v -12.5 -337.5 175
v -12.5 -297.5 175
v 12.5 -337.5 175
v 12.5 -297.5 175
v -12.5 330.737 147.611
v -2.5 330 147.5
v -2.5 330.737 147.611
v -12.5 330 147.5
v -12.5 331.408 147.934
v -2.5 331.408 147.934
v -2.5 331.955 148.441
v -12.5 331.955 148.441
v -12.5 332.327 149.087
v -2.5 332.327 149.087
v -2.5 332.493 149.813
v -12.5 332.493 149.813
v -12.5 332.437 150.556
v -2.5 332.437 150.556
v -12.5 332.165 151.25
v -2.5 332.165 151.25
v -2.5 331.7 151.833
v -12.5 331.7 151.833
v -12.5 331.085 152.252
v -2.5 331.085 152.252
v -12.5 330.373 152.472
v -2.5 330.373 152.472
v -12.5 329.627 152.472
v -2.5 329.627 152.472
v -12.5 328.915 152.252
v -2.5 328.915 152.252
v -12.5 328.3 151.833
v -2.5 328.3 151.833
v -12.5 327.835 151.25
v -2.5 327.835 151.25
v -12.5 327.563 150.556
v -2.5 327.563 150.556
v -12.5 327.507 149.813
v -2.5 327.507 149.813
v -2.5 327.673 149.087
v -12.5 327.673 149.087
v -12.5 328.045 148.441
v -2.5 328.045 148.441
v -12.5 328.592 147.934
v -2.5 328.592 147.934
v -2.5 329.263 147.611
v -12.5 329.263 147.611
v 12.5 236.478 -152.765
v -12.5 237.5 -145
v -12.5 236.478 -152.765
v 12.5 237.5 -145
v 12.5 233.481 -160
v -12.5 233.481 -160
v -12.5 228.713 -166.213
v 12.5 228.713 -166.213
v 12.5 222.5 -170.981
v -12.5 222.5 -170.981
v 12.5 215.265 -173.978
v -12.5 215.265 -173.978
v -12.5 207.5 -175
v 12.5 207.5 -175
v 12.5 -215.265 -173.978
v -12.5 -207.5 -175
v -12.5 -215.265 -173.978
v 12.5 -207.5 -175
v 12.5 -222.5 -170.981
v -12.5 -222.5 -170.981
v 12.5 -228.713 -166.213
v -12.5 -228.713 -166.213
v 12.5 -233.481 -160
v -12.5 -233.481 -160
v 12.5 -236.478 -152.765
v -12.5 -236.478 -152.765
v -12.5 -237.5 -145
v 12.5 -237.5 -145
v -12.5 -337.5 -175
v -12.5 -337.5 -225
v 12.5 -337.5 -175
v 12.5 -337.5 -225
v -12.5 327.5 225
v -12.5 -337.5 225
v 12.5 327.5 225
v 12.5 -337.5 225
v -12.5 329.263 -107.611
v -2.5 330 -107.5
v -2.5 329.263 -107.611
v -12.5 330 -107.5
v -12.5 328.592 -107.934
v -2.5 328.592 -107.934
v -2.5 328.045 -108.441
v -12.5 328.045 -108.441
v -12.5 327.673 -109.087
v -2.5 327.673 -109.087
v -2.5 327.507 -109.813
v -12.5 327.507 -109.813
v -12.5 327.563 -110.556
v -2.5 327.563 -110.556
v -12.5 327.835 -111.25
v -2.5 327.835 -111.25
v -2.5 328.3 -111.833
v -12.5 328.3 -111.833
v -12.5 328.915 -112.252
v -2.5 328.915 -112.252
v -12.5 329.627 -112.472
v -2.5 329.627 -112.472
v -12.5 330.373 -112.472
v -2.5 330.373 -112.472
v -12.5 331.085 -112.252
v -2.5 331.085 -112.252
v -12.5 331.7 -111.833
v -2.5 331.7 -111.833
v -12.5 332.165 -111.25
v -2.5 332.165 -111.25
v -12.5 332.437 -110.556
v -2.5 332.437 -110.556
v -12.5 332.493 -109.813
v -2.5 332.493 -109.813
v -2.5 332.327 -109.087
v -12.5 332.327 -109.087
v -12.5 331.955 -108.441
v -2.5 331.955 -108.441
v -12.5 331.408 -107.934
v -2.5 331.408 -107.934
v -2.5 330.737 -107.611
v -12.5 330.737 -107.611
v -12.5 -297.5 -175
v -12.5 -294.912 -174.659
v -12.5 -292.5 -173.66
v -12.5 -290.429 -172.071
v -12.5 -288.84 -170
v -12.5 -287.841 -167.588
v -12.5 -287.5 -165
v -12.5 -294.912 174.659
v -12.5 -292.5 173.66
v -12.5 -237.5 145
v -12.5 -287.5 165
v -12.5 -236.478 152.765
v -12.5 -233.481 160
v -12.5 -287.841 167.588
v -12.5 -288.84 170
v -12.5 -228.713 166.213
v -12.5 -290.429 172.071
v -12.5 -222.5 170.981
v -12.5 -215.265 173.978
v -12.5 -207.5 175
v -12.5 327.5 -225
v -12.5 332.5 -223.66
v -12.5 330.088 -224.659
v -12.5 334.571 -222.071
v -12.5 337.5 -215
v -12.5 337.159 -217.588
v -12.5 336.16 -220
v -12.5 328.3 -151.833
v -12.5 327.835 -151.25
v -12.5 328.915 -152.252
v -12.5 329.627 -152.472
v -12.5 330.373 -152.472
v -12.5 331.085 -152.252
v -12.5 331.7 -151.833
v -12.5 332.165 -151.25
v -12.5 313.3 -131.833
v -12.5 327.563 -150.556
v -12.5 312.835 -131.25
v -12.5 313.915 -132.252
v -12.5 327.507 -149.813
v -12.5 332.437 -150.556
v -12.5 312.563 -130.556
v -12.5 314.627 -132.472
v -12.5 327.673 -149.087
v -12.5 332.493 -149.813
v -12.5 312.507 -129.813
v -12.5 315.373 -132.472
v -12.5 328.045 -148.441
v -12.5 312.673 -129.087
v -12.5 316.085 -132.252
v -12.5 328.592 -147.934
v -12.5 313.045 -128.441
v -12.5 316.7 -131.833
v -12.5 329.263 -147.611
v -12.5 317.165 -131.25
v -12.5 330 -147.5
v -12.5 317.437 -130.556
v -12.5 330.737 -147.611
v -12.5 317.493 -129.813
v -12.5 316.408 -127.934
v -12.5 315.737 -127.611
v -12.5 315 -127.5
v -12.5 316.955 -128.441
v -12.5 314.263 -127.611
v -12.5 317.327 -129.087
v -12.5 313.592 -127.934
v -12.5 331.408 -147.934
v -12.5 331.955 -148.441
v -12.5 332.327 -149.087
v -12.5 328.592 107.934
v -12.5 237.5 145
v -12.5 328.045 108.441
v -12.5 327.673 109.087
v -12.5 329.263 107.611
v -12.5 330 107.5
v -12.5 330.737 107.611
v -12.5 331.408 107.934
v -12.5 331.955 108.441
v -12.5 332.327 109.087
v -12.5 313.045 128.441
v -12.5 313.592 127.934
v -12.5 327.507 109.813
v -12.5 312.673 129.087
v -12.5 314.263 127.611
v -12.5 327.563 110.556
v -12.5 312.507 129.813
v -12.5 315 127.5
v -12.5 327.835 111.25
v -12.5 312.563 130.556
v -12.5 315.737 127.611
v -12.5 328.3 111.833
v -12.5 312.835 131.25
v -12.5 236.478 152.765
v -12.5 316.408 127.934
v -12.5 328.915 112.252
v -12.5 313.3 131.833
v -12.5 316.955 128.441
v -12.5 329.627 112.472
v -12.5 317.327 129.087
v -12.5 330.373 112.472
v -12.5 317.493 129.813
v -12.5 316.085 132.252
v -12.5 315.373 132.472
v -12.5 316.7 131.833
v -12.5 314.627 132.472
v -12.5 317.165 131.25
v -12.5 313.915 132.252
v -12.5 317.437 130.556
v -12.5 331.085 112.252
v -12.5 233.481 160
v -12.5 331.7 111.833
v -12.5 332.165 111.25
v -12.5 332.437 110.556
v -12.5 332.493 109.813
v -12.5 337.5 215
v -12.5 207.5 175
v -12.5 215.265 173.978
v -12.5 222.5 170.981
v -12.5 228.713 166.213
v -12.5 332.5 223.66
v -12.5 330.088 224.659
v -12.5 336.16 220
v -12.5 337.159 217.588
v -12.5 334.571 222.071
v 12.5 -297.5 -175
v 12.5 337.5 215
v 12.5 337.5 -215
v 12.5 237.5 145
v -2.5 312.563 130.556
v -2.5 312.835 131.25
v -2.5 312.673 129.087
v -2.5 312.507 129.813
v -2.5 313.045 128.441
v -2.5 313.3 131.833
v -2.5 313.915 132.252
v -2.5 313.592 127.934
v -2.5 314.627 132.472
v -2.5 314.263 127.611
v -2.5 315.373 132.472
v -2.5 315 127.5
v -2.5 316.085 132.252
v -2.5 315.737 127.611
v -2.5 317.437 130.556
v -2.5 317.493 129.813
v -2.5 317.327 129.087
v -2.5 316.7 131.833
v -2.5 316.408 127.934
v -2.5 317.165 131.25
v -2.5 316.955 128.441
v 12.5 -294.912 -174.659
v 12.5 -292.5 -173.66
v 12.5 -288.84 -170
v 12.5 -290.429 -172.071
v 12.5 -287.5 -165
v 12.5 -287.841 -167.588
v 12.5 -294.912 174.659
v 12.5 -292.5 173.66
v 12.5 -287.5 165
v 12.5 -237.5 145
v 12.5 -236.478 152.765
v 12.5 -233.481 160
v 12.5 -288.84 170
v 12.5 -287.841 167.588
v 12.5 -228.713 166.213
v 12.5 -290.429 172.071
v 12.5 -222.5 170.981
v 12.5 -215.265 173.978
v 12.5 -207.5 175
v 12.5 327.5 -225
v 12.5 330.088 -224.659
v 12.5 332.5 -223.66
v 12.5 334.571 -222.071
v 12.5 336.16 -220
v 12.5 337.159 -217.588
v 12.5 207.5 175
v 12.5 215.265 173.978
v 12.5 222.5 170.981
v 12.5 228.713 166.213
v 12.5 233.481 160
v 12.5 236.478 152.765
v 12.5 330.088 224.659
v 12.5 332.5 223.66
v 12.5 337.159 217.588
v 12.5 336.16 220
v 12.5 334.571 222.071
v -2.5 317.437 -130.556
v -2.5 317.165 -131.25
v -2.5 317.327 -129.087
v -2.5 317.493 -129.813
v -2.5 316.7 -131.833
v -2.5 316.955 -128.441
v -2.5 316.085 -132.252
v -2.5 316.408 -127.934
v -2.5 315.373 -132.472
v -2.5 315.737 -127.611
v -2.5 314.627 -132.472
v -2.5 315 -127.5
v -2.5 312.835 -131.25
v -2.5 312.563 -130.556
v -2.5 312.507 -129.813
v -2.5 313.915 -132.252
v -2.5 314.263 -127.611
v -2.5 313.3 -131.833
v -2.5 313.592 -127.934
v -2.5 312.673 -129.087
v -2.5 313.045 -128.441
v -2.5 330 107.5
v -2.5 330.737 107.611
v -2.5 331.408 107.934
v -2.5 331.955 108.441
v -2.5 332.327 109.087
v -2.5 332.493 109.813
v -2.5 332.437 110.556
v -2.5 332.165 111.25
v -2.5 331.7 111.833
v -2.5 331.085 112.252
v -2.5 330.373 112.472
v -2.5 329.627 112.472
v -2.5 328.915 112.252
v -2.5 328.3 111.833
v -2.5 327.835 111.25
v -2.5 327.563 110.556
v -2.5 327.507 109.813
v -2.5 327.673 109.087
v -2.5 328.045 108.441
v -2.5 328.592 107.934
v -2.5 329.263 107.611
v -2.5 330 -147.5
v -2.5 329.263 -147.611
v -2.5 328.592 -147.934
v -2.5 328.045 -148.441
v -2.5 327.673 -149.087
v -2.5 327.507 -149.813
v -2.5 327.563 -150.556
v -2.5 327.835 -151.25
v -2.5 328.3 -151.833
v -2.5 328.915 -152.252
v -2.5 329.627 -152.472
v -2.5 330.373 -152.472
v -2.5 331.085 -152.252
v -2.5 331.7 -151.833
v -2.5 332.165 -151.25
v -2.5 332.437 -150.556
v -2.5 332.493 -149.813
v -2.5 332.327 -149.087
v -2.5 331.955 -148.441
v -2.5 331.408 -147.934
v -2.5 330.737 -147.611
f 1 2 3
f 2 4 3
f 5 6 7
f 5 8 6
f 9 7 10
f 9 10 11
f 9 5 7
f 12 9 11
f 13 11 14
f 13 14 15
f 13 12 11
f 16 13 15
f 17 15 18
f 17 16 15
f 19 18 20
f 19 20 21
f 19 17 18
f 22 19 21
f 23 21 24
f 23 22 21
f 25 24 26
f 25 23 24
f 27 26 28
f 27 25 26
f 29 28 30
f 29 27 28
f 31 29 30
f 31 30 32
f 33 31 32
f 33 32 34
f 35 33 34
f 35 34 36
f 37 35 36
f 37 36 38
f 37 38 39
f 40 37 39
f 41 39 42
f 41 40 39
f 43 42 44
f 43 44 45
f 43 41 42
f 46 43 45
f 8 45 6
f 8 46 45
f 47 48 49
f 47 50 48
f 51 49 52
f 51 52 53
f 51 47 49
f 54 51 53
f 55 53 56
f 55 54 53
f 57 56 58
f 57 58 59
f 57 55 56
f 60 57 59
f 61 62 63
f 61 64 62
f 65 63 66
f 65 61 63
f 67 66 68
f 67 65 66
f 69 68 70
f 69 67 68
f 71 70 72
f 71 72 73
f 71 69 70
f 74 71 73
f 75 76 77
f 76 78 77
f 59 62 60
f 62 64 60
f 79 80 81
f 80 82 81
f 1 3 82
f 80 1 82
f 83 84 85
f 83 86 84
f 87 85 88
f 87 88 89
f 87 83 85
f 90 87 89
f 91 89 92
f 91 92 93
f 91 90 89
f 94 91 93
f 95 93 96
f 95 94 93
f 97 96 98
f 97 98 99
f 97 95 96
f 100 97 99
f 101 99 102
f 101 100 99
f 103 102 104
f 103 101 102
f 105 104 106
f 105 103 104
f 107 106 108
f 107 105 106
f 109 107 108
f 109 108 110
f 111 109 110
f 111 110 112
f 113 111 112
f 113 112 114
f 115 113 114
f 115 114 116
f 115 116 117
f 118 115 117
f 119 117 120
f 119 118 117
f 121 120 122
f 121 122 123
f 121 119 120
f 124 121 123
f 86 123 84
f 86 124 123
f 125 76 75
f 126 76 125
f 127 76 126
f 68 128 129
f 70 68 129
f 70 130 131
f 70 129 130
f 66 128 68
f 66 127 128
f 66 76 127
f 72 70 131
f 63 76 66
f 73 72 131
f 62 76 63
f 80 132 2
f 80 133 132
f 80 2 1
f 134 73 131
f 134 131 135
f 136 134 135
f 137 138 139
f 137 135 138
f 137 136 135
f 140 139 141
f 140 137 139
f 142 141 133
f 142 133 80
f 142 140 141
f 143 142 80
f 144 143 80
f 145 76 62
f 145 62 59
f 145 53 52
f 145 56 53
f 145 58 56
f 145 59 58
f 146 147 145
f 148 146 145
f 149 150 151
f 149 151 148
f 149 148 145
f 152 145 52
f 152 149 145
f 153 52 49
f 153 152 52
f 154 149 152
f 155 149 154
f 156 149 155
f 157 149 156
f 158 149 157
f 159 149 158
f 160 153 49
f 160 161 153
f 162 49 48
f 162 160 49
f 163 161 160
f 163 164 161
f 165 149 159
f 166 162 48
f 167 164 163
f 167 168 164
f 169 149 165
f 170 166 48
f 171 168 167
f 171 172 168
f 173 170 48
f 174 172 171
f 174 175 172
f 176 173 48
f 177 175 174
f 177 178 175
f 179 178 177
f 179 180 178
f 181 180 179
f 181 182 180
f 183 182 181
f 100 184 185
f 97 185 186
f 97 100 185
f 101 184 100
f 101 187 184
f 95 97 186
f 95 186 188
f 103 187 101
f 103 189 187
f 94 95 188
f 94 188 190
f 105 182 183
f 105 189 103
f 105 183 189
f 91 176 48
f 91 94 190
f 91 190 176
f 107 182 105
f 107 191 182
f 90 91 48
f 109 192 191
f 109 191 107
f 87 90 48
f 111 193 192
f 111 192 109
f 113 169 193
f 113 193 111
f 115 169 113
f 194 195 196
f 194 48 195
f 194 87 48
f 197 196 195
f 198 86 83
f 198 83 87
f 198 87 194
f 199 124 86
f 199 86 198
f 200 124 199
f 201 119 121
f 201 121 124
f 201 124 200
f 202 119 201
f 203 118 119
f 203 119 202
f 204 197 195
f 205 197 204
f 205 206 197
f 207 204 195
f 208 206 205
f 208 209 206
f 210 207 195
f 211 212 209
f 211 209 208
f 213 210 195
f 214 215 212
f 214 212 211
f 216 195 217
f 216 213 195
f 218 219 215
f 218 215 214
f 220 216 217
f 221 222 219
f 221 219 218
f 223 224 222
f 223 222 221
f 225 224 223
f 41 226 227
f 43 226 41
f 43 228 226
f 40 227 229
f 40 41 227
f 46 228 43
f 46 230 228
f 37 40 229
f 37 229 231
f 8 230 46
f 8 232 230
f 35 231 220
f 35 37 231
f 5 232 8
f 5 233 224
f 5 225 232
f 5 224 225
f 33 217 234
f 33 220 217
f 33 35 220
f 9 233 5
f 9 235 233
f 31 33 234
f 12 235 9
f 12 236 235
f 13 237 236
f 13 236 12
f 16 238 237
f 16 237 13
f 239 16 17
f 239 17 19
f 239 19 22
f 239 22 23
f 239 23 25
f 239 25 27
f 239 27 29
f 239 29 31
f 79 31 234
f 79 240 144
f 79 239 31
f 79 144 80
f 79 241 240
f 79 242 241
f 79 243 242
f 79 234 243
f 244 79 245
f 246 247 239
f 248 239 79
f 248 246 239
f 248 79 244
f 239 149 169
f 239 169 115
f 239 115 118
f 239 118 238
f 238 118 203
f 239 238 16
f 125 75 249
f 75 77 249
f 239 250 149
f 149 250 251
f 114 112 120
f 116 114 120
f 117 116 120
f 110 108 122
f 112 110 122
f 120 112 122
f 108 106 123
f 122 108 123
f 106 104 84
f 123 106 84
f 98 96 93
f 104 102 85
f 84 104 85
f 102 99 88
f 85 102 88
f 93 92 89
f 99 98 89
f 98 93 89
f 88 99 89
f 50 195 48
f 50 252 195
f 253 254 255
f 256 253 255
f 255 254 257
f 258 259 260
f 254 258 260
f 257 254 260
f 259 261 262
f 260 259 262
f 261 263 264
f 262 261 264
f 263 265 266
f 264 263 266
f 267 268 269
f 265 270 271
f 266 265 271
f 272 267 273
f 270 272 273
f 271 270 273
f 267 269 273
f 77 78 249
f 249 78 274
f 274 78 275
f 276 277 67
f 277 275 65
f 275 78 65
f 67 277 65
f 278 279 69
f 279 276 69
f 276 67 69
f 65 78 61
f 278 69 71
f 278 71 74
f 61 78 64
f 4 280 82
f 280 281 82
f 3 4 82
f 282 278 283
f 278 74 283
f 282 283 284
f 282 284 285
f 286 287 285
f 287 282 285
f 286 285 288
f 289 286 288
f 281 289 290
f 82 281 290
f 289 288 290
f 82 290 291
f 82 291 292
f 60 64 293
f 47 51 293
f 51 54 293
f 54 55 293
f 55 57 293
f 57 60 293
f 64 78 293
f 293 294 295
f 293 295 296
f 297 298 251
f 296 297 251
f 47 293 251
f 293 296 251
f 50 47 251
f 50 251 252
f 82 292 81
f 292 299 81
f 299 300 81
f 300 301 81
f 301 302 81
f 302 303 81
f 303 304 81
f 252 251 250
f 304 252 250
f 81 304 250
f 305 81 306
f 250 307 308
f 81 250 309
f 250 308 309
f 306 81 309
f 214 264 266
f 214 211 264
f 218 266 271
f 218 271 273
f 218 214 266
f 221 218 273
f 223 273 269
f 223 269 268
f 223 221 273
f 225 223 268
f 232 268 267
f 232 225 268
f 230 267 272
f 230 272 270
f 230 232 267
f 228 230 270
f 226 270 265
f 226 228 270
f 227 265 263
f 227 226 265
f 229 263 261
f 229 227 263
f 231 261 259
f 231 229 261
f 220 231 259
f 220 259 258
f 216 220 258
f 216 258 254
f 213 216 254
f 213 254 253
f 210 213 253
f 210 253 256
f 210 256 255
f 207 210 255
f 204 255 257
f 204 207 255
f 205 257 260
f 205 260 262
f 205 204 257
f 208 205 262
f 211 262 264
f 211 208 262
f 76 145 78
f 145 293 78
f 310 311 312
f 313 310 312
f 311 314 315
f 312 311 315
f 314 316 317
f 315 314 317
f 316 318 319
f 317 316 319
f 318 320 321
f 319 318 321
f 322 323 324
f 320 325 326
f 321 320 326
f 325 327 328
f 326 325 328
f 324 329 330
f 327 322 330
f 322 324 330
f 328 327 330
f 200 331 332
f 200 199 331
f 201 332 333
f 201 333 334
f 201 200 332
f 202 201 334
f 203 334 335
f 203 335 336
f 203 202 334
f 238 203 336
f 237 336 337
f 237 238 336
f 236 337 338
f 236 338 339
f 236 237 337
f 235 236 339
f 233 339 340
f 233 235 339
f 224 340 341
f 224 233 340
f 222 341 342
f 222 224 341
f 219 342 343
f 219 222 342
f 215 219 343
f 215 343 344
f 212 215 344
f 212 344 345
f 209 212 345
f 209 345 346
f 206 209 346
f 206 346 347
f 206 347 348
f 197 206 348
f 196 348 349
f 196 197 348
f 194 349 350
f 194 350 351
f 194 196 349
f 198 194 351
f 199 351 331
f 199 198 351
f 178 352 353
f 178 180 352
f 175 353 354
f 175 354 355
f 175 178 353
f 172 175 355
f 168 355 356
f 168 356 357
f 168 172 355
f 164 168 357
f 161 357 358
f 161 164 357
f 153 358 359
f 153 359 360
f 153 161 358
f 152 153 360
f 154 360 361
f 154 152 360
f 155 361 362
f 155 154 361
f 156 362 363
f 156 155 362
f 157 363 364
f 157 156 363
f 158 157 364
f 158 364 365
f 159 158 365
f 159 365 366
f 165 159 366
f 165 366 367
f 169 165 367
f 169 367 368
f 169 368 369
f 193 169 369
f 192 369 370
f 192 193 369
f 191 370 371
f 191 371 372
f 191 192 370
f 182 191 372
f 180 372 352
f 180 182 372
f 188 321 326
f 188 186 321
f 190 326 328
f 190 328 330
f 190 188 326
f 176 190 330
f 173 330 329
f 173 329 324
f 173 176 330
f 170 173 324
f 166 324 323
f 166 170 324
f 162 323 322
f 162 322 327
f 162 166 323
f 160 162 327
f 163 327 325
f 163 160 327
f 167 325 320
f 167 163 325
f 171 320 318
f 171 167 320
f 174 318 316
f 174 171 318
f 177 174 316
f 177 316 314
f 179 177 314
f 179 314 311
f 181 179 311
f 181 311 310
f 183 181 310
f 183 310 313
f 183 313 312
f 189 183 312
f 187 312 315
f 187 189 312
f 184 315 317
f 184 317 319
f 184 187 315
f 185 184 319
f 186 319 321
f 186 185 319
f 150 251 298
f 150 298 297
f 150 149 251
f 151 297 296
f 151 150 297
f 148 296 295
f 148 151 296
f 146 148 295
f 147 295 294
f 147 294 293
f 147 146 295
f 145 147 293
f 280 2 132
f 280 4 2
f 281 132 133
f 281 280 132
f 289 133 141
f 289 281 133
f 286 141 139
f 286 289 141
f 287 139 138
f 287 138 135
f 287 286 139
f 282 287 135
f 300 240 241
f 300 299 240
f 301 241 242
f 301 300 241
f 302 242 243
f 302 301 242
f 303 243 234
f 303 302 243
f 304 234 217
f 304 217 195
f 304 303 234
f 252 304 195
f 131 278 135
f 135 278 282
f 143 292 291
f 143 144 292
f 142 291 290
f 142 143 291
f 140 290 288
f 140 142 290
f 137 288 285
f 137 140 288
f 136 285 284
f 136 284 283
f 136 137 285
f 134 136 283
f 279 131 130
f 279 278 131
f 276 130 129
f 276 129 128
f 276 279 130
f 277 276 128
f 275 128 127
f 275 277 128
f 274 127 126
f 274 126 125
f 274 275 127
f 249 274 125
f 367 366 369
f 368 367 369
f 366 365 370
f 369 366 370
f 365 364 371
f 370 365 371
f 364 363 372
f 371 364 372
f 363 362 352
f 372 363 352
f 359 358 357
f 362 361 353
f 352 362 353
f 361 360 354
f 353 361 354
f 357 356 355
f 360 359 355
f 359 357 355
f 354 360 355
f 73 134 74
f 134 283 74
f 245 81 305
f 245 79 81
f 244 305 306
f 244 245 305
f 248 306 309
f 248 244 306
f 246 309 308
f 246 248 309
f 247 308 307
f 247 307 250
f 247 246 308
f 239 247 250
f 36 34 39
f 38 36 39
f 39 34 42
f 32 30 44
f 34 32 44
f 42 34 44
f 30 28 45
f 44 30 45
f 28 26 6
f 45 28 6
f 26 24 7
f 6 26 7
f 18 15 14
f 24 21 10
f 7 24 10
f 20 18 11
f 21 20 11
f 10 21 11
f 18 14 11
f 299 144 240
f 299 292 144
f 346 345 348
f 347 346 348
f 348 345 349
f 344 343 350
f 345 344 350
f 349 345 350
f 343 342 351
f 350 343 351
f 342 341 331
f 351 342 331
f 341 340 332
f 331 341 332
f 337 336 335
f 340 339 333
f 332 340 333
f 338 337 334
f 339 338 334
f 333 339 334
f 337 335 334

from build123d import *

# Parameters (mm, degrees)
SKETCH1_R           = 2.5
SKETCH1_W           = 350
SKETCH1_H           = 475
BOSS_EXTRUDE1_DEPTH = 12.5
BOSS_EXTRUDE2_START = -15
SKETCH2_R           = 2.5
BOSS_EXTRUDE2_DEPTH = 15
FILLET1_R           = 10
FILLET2_R           = 30
FILLET3_R           = 10


with BuildPart() as part:
    # Sketch1 → Boss-Extrude1 (new, symmetric)
    with BuildSketch(Plane(origin=(0, 0, 0), x_dir=(0, 0, -1), z_dir=(1, 0, 0))):
        Polygon((-175, -337.5), (-225, -337.5), (-225, 337.5), (225, 337.5), (225, -337.5), (175, -337.5), (175, -287.5), (-175, -287.5), align=None)
        with Locations((-150, 330)):
            Circle(SKETCH1_R, mode=Mode.SUBTRACT)
        with Locations((-110, 330)):
            Circle(SKETCH1_R, mode=Mode.SUBTRACT)
        with Locations((-130, 315)):
            Circle(SKETCH1_R, mode=Mode.SUBTRACT)
        with Locations(Location((110, 330, 0), (0, 0, 180))):
            Circle(SKETCH1_R, mode=Mode.SUBTRACT)
        with Locations(Location((150, 330, 0), (0, 0, 180))):
            Circle(SKETCH1_R, mode=Mode.SUBTRACT)
        with Locations(Location((130, 315, 0), (0, 0, 180))):
            Circle(SKETCH1_R, mode=Mode.SUBTRACT)
        Rectangle(SKETCH1_W, SKETCH1_H, mode=Mode.SUBTRACT)
    extrude(amount=BOSS_EXTRUDE1_DEPTH, both=True)

    # Sketch2 → Boss-Extrude2 (add)
    with BuildSketch(Plane(origin=(12.5, 0, 0), x_dir=(0, 0, -1), z_dir=(1, 0, 0)).offset(BOSS_EXTRUDE2_START)):
        with Locations((-110, 330)):
            Circle(SKETCH2_R)
        with Locations((-130, 315)):
            Circle(SKETCH2_R)
        with Locations((-150, 330)):
            Circle(SKETCH2_R)
        with Locations(Location((150, 330, 0), (0, 0, 180))):
            Circle(SKETCH2_R)
        with Locations(Location((130, 315, 0), (0, 0, 180))):
            Circle(SKETCH2_R)
        with Locations(Location((110, 330, 0), (0, 0, 180))):
            Circle(SKETCH2_R)
    extrude(amount=BOSS_EXTRUDE2_DEPTH)

    # Fillet1
    fillet1_edges = [part.edges().sort_by_distance(p)[0] for p in [
        (0, -287.5, -175),
        (0, -287.5, 175),
    ]]
    fillet(fillet1_edges, radius=FILLET1_R)

    # Fillet2
    fillet2_edges = [part.edges().sort_by_distance(p)[0] for p in [
        (0, 237.5, 175),
        (0, -237.5, 175),
        (0, -237.5, -175),
        (0, 237.5, -175),
    ]]
    fillet(fillet2_edges, radius=FILLET2_R)

    # Fillet3
    fillet3_edges = [part.edges().sort_by_distance(p)[0] for p in [
        (0, 337.5, 225),
        (0, 337.5, -225),
    ]]
    fillet(fillet3_edges, radius=FILLET3_R)


solid = part.part
